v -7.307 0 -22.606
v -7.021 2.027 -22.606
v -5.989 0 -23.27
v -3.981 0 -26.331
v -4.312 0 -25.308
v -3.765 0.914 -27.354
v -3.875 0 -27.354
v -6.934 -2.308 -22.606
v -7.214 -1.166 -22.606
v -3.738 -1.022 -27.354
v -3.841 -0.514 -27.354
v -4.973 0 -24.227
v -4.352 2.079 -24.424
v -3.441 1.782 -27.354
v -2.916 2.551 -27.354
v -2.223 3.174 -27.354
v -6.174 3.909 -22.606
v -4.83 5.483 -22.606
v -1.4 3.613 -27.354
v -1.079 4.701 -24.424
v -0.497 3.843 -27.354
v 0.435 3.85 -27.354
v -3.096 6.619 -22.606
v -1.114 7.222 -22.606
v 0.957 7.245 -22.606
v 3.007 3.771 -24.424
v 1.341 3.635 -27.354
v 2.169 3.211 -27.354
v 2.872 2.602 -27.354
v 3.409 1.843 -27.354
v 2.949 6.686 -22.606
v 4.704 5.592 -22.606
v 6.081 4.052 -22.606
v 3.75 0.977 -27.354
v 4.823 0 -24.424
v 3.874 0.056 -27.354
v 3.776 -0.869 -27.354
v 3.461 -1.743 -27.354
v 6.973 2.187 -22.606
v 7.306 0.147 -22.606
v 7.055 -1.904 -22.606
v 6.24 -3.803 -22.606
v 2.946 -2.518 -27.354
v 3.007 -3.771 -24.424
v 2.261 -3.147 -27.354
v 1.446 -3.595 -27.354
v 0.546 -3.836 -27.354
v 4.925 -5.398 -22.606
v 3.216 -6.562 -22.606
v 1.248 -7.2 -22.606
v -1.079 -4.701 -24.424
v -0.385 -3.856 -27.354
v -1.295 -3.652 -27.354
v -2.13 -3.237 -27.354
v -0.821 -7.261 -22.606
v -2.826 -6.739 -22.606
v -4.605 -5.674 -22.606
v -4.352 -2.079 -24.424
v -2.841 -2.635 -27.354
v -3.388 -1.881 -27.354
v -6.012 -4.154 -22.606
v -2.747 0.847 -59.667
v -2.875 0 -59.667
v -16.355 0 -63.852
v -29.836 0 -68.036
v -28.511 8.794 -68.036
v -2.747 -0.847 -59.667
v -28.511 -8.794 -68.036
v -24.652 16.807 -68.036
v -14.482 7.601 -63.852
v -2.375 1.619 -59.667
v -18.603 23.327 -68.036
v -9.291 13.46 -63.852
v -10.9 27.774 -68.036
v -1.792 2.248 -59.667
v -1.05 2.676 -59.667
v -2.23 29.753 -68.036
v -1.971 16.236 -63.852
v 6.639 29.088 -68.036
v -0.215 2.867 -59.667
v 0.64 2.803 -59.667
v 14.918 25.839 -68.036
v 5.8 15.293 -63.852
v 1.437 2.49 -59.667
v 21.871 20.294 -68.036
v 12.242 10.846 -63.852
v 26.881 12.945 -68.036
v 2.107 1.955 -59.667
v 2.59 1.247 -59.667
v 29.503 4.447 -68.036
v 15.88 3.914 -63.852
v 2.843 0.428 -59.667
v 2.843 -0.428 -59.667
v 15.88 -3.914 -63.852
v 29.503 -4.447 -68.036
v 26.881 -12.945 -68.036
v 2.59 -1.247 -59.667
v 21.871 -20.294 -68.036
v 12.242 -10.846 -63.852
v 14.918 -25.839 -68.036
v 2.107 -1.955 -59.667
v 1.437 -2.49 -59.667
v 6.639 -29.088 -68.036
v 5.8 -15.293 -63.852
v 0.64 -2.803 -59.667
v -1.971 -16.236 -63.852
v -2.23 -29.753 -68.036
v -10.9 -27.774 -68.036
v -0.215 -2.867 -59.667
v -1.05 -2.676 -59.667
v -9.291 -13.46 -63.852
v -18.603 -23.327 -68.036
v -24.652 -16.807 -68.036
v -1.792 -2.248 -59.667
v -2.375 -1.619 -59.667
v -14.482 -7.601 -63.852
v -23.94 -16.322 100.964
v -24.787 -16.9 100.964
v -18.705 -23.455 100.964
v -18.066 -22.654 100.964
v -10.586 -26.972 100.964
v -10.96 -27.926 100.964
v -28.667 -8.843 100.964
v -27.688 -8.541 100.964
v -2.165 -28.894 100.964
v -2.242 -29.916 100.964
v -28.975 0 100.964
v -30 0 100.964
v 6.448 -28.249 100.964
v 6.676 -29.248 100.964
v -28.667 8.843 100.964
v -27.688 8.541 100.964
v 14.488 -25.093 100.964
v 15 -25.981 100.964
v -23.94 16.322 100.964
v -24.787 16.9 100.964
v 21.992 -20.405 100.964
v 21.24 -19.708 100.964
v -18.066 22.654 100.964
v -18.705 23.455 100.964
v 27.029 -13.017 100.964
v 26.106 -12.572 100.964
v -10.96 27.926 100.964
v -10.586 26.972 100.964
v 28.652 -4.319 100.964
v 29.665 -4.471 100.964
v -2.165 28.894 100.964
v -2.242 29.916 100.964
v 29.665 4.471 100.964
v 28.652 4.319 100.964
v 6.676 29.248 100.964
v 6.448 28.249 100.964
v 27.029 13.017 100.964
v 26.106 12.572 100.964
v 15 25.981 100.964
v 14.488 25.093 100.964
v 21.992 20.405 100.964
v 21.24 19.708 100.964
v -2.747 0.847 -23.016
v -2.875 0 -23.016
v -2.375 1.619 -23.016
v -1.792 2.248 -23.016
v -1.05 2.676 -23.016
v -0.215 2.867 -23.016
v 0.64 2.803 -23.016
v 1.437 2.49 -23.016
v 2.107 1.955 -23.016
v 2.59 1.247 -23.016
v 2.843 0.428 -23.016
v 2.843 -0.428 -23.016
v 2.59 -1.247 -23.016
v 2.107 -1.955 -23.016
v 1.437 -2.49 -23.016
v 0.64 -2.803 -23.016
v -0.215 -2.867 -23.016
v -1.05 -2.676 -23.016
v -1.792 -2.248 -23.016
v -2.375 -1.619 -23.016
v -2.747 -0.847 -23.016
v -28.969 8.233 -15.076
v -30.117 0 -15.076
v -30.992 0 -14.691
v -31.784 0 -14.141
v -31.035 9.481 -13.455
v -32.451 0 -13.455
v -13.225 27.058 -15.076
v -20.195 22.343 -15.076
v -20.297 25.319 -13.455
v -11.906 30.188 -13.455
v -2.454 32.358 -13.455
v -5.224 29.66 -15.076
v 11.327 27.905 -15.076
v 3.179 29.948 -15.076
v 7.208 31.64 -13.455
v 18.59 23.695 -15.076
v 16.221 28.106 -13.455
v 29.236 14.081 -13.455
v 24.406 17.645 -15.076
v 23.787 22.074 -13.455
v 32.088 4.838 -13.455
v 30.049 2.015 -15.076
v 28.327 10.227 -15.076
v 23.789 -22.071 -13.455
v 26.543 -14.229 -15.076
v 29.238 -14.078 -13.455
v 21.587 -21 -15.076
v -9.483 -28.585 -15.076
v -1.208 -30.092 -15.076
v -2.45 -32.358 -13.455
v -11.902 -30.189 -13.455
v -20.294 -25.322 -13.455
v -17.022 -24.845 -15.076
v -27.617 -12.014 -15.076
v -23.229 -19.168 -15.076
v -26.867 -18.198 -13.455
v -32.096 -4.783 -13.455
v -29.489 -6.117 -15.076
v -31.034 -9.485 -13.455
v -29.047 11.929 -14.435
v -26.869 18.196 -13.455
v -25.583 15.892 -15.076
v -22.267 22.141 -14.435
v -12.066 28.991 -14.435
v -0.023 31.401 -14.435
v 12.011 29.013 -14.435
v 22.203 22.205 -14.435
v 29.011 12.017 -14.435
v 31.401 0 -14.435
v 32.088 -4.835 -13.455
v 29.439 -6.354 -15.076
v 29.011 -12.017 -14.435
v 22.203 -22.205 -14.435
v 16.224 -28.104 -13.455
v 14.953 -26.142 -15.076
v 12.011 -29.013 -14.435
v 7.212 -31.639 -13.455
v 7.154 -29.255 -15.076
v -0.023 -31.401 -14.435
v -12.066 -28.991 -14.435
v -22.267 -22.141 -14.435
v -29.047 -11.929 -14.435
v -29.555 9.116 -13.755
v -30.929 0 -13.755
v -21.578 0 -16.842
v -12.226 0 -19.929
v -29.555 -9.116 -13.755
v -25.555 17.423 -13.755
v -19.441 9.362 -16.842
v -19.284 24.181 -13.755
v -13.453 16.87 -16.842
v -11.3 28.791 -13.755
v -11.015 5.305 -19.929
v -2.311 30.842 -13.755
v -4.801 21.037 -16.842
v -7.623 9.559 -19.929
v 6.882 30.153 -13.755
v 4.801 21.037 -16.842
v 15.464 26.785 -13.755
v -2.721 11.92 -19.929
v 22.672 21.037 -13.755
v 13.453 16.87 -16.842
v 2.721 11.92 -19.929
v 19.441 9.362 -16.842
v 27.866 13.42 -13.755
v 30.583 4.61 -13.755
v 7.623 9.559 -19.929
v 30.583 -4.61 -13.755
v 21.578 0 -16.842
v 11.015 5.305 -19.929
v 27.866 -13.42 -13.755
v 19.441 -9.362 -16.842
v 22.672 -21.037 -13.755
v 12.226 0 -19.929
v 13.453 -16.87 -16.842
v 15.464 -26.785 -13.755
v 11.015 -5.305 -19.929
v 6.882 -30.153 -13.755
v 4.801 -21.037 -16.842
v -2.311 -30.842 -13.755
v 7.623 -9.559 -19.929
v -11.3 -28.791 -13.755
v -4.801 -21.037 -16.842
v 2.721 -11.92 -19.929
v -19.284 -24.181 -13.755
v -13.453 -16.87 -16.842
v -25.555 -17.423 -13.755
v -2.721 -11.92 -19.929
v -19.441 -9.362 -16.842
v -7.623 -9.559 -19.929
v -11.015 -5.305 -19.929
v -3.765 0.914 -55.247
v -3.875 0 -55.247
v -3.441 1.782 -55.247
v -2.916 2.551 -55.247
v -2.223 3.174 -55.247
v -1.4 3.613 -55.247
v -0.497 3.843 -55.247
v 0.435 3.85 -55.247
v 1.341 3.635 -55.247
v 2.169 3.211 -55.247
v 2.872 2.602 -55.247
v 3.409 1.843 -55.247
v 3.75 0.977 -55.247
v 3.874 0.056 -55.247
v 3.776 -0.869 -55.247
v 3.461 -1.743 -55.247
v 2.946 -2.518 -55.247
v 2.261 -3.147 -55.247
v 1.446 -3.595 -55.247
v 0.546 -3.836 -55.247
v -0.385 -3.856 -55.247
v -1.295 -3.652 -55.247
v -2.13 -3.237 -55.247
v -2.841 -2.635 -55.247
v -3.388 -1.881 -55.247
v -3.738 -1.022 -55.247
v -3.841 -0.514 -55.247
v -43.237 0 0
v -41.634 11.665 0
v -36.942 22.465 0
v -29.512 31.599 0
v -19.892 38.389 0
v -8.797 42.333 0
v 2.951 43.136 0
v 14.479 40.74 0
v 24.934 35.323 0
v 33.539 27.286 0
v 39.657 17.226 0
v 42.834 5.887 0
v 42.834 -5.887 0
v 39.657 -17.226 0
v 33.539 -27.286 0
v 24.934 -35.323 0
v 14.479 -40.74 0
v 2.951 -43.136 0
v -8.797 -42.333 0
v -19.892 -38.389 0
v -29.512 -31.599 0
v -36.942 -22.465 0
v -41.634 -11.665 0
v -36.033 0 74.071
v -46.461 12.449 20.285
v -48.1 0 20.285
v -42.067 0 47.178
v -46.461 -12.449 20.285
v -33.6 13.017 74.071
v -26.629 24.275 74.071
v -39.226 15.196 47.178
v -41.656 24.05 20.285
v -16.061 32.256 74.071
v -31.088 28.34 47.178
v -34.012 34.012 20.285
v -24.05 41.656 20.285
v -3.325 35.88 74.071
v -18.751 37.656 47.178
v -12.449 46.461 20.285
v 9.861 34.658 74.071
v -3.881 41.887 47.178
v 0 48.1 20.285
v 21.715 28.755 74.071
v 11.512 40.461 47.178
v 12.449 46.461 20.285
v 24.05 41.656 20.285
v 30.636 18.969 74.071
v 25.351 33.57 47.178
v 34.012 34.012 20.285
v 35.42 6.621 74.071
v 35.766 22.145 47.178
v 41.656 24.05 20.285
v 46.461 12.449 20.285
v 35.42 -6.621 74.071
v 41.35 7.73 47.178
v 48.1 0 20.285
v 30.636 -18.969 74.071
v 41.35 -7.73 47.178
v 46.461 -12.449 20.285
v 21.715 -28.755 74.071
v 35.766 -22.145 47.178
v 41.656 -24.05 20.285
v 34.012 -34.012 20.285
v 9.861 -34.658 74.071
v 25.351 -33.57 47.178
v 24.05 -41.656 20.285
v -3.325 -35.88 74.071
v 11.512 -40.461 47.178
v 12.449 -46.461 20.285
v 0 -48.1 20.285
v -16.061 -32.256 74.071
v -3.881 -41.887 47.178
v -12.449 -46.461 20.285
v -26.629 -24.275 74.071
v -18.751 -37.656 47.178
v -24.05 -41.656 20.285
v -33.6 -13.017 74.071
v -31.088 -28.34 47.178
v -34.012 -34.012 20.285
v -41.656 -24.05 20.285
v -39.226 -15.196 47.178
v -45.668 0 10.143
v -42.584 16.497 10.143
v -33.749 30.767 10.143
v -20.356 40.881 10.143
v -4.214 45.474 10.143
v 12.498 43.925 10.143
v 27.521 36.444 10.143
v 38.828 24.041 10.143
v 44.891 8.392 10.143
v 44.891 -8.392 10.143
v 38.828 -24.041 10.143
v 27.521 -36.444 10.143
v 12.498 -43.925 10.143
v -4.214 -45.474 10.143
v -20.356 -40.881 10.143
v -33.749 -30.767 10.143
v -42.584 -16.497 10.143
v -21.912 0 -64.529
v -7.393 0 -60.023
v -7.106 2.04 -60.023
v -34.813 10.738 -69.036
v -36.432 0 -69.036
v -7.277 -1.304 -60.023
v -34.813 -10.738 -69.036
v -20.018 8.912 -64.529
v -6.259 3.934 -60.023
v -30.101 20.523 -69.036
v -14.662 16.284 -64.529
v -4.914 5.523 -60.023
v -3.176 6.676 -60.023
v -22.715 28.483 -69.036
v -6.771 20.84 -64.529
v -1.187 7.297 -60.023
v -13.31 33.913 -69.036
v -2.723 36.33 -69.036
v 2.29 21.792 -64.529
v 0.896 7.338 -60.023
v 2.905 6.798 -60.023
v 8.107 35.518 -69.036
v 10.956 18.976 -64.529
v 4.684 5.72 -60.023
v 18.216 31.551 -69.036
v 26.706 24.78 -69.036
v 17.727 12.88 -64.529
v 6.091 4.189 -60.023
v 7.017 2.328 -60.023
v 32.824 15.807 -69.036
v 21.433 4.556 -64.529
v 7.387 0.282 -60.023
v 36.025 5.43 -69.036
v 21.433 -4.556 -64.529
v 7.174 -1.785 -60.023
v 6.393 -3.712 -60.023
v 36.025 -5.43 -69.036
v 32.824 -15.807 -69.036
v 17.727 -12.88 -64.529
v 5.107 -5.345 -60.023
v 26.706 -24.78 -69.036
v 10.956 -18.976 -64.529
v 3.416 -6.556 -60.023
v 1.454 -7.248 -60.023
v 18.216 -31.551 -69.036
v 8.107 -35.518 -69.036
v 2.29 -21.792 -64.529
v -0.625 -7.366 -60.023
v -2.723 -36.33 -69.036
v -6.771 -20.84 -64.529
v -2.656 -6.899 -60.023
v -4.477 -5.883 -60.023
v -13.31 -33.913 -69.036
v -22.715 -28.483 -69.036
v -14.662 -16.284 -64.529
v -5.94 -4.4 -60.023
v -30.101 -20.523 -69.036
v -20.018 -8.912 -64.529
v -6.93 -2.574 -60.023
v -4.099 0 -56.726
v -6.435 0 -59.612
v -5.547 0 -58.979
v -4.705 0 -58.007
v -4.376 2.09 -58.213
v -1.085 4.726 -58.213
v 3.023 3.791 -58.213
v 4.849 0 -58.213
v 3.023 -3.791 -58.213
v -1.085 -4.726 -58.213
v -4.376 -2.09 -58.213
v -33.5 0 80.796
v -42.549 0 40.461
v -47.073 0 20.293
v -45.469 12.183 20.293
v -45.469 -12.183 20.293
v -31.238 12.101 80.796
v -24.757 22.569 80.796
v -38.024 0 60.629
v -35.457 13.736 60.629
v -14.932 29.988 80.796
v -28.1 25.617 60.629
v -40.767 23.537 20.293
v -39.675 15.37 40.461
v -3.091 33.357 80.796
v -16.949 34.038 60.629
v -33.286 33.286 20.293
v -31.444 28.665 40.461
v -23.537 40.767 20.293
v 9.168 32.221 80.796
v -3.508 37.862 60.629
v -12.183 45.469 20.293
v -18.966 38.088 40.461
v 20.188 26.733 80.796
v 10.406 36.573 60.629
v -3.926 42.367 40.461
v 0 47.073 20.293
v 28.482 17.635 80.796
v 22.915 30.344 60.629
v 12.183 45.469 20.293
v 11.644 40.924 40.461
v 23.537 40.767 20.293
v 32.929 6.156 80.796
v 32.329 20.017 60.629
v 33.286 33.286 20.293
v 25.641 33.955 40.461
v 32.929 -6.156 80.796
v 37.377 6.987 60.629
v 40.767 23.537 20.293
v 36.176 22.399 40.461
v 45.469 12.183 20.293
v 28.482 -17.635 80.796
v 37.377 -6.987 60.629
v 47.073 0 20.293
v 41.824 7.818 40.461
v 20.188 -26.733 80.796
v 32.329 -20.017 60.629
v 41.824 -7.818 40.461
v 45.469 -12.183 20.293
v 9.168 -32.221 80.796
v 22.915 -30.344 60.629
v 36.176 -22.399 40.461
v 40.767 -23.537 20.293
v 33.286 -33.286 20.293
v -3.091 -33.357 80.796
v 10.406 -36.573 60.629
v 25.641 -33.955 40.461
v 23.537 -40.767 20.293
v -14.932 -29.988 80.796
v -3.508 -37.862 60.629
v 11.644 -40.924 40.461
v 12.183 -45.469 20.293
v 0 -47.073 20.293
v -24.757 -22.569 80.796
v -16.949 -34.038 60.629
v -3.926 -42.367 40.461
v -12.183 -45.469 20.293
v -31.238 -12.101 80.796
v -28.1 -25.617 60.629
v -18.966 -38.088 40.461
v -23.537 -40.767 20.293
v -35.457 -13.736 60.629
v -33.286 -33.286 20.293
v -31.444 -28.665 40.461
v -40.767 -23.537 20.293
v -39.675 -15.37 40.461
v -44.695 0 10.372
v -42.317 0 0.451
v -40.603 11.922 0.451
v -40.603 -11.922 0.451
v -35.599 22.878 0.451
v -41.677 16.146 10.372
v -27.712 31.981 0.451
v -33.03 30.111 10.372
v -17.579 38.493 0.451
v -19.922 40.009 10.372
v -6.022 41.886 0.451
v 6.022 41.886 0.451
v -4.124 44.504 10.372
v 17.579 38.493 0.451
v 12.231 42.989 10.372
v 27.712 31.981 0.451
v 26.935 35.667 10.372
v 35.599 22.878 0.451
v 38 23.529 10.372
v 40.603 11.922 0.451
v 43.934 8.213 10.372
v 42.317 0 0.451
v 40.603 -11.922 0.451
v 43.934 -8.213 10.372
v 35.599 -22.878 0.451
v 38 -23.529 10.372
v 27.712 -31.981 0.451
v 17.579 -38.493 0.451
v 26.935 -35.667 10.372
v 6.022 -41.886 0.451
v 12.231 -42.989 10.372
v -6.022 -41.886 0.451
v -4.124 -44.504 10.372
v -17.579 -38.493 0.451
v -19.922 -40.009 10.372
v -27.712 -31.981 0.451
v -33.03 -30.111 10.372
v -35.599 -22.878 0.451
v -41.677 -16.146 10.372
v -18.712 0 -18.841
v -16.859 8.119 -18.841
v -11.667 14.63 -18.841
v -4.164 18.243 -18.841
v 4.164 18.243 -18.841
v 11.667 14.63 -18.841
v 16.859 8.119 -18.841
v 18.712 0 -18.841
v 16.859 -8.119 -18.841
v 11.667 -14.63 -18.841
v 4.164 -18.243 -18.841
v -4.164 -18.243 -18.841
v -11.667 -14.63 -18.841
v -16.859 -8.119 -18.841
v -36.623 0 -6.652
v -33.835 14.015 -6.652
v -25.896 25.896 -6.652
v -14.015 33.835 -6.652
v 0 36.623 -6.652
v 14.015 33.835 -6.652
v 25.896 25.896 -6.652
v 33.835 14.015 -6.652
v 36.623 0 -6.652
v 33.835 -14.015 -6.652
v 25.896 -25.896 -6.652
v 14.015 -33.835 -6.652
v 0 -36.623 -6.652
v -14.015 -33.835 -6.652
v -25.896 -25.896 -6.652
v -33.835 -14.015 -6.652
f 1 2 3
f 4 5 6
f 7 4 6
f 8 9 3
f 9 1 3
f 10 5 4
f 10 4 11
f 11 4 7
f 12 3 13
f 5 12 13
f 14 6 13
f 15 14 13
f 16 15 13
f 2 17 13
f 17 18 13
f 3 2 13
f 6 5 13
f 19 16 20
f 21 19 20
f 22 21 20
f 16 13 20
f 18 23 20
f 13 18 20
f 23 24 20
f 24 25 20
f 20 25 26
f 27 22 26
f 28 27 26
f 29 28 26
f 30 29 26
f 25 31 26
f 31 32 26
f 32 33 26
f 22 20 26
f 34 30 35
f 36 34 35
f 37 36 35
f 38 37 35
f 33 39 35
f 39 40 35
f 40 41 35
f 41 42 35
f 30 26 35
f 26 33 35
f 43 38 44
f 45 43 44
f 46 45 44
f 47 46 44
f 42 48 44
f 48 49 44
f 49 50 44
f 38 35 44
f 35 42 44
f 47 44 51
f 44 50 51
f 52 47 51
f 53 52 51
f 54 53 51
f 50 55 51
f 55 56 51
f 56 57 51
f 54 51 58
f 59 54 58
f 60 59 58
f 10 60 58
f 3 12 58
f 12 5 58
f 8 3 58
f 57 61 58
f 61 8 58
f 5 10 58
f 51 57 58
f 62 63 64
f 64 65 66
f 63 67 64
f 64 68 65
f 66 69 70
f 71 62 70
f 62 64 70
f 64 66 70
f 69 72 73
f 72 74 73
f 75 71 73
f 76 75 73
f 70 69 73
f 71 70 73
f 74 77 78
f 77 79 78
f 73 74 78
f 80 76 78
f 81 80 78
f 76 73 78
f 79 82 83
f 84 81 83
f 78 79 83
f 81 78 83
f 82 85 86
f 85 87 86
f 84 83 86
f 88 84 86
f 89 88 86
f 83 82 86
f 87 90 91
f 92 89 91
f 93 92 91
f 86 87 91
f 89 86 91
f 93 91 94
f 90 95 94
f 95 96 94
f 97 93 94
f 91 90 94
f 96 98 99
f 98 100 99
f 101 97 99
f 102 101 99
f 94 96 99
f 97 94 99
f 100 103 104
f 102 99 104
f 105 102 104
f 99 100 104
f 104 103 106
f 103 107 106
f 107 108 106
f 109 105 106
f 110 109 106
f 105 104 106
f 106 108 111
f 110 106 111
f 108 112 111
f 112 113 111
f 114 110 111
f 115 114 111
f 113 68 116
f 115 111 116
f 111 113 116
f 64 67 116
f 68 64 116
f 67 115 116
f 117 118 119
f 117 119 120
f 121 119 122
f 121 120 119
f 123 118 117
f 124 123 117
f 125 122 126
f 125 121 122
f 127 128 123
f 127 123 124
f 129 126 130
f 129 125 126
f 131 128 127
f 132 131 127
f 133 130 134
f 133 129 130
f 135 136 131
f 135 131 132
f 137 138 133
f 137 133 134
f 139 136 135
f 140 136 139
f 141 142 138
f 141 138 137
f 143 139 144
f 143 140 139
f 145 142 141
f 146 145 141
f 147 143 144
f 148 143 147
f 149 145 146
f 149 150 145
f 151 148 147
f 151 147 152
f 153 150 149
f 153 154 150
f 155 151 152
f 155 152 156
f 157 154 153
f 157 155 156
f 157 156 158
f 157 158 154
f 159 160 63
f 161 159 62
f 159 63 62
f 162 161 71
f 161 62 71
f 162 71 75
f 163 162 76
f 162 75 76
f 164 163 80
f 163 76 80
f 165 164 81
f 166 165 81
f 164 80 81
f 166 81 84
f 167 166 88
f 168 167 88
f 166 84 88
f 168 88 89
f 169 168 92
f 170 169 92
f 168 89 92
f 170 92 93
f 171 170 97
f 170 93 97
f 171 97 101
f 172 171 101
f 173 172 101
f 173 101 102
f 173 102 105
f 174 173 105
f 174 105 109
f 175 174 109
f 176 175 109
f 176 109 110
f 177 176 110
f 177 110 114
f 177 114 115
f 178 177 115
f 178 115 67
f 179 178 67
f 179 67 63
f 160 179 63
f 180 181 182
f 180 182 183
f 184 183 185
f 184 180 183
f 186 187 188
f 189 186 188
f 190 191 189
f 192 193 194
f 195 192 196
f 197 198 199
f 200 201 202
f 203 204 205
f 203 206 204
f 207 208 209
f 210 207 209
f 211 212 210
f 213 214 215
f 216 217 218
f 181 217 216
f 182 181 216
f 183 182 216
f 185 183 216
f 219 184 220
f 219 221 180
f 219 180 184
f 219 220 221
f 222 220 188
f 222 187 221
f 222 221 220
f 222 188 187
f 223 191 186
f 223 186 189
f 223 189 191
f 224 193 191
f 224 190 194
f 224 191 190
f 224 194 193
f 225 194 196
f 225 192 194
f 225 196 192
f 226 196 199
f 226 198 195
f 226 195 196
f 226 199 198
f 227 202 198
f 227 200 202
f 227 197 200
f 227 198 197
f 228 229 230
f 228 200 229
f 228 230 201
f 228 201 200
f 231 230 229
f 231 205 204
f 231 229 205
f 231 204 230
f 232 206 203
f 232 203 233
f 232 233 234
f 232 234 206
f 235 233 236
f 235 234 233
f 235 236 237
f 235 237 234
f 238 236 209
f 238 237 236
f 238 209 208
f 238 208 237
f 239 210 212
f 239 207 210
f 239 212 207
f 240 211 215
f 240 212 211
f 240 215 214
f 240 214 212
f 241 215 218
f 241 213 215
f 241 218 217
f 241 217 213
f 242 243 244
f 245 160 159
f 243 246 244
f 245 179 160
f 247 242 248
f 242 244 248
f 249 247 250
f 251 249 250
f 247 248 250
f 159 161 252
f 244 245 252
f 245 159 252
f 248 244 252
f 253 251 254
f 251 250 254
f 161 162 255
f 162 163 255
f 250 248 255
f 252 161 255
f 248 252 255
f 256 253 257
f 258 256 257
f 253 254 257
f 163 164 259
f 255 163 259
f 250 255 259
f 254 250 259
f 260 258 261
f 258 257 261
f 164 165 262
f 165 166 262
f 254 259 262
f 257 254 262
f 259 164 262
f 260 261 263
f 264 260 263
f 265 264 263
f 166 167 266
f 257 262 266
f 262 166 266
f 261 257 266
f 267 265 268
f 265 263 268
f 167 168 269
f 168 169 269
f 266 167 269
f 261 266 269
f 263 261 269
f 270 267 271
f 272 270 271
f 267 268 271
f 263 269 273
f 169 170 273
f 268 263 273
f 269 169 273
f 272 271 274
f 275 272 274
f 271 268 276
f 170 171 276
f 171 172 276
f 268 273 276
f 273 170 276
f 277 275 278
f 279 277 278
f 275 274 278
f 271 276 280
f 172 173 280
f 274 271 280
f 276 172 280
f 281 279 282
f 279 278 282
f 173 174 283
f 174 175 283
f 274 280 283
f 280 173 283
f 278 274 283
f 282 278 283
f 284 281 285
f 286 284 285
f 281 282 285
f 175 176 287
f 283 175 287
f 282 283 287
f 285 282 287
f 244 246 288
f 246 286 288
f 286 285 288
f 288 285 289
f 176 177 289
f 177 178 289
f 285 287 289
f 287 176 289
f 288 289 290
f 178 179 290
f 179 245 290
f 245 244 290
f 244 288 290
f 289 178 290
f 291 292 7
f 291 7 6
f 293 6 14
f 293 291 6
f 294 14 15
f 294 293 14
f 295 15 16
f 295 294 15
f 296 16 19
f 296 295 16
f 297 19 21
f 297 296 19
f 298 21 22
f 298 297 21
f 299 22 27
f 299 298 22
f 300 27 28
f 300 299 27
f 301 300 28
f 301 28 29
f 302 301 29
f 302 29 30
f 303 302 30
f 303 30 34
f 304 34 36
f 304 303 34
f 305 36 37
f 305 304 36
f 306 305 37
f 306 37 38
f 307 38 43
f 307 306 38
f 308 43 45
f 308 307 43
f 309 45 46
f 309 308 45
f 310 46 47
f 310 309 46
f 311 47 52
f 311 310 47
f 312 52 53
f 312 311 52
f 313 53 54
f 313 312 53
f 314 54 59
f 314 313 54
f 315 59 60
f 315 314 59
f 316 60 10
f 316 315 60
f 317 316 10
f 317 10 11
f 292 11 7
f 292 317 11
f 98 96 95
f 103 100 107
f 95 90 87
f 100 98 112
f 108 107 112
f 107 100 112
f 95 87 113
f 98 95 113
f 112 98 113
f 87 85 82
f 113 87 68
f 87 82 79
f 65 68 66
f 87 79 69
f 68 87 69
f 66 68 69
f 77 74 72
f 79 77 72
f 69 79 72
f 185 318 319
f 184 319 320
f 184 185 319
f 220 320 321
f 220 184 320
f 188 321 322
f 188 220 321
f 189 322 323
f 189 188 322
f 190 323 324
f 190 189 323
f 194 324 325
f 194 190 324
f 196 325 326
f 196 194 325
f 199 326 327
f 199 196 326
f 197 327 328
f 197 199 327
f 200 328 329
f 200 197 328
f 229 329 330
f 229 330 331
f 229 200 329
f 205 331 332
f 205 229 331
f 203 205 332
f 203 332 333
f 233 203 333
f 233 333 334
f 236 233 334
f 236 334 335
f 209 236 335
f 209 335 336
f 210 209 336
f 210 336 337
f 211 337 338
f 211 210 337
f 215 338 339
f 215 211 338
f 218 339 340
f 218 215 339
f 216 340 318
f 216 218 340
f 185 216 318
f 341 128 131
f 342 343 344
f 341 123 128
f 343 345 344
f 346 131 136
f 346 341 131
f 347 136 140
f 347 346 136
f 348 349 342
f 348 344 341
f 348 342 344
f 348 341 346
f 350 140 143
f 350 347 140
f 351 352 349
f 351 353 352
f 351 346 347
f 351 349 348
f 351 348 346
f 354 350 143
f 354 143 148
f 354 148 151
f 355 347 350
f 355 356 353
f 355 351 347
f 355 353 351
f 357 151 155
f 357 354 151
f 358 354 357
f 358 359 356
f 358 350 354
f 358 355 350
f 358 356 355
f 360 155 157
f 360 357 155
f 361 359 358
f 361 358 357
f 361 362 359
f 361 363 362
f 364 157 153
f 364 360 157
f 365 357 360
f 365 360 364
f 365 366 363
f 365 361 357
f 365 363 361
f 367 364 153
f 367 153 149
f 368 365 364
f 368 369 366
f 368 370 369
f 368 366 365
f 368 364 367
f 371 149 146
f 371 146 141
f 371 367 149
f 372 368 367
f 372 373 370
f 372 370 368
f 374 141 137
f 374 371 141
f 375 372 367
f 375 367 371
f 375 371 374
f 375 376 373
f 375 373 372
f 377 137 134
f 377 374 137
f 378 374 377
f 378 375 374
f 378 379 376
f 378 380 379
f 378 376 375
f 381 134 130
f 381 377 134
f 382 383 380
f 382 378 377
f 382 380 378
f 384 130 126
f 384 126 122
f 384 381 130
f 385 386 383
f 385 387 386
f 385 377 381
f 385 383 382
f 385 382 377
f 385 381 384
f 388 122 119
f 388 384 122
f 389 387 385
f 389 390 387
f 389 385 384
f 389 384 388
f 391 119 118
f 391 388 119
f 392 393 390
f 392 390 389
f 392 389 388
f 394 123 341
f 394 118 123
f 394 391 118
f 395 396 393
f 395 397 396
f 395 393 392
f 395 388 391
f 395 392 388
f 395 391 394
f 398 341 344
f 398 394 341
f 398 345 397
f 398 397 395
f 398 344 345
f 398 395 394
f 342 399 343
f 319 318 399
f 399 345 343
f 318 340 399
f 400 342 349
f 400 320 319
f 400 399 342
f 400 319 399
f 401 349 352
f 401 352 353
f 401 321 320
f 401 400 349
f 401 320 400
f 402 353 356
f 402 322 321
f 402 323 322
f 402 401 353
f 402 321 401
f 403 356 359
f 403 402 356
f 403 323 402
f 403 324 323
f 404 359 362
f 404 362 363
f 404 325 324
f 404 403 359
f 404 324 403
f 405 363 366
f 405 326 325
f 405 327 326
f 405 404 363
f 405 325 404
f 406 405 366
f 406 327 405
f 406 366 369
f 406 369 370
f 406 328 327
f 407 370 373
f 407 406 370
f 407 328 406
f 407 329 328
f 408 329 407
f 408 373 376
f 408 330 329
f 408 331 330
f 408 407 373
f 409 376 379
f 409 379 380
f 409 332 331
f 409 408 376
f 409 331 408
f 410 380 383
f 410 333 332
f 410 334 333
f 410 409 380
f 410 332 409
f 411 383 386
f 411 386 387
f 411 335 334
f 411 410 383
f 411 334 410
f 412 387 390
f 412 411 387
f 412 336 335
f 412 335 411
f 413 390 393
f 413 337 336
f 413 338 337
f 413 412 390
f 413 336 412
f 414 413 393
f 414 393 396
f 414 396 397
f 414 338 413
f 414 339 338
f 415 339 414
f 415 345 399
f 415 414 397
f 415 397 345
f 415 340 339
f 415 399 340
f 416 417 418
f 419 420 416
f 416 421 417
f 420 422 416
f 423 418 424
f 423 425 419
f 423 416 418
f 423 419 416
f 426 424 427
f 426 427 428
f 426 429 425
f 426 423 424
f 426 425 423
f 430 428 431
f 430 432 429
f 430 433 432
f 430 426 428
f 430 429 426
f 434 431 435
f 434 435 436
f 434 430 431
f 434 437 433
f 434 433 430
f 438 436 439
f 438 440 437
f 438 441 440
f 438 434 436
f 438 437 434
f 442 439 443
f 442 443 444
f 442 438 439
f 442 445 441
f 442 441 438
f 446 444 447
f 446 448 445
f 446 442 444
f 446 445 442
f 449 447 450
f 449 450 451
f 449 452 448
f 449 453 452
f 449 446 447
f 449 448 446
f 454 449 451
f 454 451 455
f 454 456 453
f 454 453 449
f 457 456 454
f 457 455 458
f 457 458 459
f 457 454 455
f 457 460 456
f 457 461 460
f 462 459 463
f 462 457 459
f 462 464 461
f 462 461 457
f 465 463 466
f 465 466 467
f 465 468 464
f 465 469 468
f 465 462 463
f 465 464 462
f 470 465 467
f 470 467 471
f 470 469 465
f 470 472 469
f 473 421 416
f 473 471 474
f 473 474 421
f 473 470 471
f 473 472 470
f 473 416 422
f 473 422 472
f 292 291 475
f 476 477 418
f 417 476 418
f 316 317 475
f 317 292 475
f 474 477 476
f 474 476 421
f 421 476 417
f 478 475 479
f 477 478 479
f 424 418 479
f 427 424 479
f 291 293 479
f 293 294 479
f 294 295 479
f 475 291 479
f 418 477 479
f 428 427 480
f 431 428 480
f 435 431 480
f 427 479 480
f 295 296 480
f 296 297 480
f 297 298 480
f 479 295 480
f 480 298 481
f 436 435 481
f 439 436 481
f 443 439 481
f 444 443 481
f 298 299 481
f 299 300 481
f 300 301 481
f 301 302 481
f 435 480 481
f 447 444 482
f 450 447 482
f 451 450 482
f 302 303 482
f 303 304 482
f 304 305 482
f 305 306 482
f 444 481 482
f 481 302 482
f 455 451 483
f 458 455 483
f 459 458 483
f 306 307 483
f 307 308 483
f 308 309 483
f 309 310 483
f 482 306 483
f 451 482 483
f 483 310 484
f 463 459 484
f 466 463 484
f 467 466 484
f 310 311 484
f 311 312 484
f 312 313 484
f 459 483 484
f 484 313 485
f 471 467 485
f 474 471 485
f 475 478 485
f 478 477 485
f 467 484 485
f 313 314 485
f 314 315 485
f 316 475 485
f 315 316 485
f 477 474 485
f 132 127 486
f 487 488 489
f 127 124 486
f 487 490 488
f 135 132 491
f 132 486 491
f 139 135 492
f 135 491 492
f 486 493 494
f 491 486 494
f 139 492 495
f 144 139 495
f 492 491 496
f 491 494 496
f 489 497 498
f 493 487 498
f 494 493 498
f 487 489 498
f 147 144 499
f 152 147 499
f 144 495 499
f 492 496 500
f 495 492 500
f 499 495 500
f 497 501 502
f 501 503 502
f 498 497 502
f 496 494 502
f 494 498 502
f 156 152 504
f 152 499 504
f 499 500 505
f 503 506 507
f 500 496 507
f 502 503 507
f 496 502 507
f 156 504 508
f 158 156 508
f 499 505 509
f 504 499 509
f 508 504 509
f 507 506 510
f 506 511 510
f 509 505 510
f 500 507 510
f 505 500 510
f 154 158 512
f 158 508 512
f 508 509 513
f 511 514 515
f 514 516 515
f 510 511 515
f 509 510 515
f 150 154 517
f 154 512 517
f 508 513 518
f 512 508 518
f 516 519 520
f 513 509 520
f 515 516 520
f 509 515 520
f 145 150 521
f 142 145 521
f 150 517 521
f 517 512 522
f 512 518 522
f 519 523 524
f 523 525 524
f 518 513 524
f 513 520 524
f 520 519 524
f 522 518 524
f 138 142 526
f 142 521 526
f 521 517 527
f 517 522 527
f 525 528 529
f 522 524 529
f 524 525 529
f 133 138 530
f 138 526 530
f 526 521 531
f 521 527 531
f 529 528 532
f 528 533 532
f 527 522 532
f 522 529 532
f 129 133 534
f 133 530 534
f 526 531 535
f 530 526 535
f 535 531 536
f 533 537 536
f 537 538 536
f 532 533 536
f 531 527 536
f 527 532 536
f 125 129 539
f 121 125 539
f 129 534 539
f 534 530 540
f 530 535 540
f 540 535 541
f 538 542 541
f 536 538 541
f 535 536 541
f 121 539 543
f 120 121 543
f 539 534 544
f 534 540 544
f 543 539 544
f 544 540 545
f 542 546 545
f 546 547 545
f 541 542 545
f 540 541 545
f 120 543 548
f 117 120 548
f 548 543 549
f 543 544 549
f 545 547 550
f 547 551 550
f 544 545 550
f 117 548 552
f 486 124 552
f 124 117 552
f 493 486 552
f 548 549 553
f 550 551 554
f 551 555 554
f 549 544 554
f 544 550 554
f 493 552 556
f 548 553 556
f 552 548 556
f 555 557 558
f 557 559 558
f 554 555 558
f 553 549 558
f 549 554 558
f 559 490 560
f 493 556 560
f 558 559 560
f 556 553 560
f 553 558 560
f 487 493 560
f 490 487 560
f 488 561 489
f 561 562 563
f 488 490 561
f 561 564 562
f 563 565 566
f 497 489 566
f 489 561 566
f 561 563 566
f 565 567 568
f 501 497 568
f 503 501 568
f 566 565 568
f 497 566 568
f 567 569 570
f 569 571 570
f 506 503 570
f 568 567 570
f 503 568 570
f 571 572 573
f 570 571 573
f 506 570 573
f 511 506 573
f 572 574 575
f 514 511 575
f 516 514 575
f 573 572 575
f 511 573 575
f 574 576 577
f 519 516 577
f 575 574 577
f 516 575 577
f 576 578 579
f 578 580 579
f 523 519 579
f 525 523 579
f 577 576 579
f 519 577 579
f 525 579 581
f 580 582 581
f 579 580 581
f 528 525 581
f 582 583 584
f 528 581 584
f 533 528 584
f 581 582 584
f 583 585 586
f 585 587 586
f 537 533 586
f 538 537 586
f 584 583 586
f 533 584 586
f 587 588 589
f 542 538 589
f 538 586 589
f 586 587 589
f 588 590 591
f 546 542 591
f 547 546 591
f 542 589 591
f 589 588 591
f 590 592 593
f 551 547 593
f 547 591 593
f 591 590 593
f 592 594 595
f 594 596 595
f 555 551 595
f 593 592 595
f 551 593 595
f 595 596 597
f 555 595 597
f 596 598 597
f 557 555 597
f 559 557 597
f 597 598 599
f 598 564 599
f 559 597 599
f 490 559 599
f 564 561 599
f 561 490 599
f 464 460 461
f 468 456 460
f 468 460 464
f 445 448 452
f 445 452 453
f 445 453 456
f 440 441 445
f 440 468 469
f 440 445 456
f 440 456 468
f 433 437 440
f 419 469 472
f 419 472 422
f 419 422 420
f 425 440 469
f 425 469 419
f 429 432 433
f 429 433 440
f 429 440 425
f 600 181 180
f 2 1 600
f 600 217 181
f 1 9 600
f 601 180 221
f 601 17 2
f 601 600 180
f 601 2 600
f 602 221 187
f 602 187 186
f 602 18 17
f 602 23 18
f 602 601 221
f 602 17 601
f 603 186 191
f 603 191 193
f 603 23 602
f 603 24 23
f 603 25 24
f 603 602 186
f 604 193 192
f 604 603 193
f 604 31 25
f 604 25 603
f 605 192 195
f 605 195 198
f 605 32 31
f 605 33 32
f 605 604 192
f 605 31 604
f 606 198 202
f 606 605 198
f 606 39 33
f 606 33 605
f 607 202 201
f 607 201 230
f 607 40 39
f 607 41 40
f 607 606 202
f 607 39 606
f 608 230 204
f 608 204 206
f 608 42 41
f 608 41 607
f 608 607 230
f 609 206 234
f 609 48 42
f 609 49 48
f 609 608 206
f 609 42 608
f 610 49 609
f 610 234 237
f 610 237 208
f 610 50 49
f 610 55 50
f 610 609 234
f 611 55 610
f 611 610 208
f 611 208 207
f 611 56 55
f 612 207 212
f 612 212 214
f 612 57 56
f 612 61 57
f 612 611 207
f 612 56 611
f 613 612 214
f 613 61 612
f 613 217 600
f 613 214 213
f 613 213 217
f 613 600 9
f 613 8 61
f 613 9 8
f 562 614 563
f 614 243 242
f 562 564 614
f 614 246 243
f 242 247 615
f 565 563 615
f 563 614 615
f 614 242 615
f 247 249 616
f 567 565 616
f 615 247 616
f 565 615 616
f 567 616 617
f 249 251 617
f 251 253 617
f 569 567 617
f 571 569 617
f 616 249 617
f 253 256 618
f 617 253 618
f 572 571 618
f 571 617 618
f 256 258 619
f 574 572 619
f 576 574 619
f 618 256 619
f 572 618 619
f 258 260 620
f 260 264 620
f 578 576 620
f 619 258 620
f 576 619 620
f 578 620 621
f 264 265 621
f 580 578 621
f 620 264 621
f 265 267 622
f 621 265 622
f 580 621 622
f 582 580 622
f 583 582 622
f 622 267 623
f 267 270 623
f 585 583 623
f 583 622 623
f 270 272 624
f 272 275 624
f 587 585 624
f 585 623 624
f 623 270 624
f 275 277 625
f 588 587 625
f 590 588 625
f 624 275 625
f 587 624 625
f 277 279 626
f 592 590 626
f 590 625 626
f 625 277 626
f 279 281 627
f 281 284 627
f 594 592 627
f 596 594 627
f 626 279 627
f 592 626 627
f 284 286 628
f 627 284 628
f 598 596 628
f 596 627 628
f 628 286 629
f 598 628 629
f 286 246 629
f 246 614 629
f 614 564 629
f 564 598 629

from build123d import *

# Parameters (mm, degrees)
F2_T = -1
F3_R = 5
F4_R = 5


with BuildPart() as f1:
    # F0 (on Front) → F1 (revolve)
    with BuildSketch(Plane.XZ):
        Polygon((0, 100.964410305), (-30, 100.964410305), (-48.0997800827, 20.2851913869), (-43.2369445397, 0), (-31.5237879753, -14.6114934236), (-3.8748302031, -23.7388100573), (0, -25.0179469585), align=None)
        Polygon((0, -69.035589695), (0, -25.0179469585), (-3.8748302031, -23.7388100573), (-3.8748302031, -58.9307323098), (-36.4315584302, -69.035589695), align=None)
    revolve(axis=Axis((0, 0, 15.964410305), (0, 0, -1)))

    # F2
    f2_openings = [f1.faces().sort_by_distance(p)[0] for p in [
        (0, 0, 100.96441),
    ]]
    offset(amount=F2_T, openings=f2_openings, kind=Kind.INTERSECTION)

    # F3
    f3_edges = [f1.edges().sort_by_distance(p)[0] for p in [
        (3.87483, 0, -58.930732),
        (3.87483, 0, -23.73881),
    ]]
    fillet(f3_edges, radius=F3_R)

    # F4
    f4_edges = [f1.edges().sort_by_distance(p)[0] for p in [
        (31.523788, 0, -14.611493),
    ]]
    fillet(f4_edges, radius=F4_R)


solid = f1.part
